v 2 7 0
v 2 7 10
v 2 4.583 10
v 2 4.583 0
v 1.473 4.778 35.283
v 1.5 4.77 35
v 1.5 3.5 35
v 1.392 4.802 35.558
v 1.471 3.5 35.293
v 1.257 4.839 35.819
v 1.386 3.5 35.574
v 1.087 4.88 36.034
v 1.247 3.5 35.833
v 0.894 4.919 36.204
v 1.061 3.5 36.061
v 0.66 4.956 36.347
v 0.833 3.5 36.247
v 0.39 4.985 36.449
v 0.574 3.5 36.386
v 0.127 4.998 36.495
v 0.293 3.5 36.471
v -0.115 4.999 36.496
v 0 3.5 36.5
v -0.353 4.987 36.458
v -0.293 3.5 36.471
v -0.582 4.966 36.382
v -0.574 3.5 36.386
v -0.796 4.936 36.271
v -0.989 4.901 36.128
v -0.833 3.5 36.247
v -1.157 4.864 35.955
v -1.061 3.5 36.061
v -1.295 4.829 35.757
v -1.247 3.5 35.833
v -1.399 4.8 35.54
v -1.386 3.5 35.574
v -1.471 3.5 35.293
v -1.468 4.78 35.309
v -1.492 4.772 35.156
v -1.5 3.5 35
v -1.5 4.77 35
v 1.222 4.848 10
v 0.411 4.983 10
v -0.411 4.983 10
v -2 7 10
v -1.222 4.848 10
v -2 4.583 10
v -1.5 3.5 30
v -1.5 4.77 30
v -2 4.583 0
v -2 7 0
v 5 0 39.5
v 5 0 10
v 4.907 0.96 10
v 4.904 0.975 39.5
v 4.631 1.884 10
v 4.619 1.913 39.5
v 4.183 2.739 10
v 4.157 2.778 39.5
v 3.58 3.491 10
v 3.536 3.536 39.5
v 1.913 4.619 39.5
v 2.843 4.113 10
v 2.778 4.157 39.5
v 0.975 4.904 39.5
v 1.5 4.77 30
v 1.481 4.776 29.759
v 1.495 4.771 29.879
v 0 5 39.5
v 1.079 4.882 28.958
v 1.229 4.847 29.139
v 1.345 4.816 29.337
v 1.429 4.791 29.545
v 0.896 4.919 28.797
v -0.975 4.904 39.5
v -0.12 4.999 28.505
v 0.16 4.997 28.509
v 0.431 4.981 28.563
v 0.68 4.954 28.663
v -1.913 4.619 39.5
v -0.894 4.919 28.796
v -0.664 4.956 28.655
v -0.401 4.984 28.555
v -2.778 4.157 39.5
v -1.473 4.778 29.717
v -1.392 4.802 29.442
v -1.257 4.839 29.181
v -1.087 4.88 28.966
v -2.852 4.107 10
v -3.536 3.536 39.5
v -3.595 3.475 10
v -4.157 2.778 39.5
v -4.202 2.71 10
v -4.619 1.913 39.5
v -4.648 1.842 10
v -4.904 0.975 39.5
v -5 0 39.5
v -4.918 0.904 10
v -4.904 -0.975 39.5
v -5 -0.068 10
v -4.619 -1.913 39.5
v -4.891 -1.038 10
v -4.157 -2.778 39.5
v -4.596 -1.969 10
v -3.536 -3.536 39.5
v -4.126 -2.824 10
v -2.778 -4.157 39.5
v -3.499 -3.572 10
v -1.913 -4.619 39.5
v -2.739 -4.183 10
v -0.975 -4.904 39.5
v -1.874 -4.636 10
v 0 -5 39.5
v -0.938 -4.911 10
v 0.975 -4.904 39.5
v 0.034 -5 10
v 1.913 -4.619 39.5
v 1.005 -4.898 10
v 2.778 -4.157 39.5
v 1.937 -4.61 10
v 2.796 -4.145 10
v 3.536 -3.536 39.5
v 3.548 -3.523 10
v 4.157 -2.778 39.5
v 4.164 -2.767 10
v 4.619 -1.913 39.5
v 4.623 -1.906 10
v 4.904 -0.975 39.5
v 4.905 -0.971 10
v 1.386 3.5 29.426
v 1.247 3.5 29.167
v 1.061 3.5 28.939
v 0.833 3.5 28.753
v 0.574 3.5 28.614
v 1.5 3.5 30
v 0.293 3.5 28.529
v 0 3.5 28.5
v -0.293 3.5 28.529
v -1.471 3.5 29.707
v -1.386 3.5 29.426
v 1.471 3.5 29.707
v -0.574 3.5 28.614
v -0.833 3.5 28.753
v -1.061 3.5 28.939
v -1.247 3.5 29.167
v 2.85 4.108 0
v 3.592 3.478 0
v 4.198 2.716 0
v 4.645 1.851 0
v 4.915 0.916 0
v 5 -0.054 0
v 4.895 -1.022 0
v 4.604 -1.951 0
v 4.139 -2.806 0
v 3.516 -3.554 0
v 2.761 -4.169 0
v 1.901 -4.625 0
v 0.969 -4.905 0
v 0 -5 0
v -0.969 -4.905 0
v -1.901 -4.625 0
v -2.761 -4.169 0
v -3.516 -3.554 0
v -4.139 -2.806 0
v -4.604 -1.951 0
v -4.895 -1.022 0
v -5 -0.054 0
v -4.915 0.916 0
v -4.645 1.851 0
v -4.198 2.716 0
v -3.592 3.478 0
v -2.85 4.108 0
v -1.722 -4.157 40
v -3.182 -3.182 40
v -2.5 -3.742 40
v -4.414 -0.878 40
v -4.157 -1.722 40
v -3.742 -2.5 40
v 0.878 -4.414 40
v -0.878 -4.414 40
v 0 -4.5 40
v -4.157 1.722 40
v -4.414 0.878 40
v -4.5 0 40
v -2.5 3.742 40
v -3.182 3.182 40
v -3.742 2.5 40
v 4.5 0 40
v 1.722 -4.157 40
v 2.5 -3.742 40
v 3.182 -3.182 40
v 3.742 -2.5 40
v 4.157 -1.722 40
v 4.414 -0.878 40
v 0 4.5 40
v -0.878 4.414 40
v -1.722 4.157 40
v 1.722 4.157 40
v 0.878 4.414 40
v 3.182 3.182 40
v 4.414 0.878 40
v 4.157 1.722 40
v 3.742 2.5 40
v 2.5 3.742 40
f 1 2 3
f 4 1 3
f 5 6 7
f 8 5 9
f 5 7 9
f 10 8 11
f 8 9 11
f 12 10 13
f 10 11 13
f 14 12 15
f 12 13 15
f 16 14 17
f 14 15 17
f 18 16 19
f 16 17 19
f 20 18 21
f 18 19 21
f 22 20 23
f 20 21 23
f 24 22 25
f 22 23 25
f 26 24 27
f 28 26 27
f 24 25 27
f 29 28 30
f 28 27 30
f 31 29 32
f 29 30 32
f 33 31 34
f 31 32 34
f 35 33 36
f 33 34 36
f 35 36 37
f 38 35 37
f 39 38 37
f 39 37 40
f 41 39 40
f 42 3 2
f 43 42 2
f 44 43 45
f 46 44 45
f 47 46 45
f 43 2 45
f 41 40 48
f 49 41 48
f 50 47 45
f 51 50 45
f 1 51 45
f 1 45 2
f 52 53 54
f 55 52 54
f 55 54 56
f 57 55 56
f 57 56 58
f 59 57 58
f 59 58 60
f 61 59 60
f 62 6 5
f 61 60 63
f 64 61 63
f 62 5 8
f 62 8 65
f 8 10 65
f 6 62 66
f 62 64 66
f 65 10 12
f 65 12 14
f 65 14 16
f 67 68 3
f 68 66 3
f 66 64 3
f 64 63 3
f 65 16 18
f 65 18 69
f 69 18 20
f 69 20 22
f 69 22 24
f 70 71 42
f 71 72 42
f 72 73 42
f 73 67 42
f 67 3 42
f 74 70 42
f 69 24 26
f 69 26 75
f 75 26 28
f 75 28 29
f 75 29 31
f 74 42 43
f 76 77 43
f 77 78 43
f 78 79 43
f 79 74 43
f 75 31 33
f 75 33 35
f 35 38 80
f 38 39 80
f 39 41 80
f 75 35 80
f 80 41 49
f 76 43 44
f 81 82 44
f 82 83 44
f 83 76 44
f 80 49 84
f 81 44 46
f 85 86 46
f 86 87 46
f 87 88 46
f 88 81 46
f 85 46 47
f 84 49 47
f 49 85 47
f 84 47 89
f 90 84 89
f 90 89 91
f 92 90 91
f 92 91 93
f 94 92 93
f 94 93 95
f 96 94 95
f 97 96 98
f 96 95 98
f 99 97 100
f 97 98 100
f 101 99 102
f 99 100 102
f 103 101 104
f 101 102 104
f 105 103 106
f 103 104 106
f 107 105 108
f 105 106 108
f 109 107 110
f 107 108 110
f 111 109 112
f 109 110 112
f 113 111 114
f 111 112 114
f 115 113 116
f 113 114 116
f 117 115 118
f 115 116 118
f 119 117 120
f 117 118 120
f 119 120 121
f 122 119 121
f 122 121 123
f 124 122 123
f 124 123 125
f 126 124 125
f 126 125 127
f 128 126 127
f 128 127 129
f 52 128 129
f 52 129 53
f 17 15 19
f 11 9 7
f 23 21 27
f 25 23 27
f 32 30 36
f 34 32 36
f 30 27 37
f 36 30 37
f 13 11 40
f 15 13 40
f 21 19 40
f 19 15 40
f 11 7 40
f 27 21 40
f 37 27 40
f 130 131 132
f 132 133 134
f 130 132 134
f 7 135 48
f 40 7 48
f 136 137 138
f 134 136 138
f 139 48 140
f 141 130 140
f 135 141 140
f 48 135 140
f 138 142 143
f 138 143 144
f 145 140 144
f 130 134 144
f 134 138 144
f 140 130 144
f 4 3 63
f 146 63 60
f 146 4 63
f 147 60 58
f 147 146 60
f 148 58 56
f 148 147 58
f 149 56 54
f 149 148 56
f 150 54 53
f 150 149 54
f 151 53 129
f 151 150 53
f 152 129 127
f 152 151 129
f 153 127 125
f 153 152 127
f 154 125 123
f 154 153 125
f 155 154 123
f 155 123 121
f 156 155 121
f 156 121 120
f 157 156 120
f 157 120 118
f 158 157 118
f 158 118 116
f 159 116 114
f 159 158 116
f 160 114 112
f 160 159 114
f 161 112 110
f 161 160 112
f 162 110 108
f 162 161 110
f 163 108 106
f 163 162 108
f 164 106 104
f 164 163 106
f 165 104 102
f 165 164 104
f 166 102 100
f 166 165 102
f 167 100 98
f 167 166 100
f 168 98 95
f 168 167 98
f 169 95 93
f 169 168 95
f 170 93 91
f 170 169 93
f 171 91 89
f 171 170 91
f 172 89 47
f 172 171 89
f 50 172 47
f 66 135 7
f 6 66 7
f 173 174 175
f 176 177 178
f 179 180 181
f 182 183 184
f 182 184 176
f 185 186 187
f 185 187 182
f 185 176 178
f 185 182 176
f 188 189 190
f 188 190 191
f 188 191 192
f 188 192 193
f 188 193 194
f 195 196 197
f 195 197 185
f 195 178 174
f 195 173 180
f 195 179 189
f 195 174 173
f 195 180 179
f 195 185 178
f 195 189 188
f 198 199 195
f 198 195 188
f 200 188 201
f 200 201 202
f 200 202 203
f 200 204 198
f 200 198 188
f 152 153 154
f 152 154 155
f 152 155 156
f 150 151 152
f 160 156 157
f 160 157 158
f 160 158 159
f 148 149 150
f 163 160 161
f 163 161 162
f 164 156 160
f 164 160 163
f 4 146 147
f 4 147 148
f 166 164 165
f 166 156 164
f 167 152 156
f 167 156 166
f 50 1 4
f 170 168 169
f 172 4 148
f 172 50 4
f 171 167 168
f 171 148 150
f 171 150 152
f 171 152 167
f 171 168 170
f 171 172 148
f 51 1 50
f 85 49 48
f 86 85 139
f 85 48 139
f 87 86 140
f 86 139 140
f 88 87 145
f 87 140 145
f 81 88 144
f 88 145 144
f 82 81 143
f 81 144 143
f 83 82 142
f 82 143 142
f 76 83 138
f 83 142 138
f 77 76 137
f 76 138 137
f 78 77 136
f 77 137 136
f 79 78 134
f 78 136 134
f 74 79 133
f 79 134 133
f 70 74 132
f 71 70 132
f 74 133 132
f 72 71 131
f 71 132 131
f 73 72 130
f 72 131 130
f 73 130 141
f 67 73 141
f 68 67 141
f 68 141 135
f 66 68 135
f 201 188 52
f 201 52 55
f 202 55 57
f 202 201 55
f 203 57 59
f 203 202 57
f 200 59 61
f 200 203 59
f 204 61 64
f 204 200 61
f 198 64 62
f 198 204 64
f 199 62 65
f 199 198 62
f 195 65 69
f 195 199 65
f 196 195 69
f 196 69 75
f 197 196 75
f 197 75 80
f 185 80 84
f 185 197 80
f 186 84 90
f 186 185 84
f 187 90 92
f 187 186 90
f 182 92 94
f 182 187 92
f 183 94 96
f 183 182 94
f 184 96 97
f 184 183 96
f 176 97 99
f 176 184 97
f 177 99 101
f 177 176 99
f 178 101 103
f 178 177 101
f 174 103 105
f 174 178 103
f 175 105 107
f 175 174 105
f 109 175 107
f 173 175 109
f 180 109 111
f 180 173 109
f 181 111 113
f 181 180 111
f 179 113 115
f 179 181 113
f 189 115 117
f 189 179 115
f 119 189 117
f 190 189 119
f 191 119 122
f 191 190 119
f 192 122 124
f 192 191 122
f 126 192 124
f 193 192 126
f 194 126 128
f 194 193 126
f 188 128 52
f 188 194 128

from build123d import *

# Parameters (mm, degrees)
BOSS_EXTRUDE1_DEPTH = 10
SKETCH2_R           = 5
BOSS_EXTRUDE2_DEPTH = 30
CUT_EXTRUDE1_START  = 3.5
CUT_EXTRUDE1_DEPTH  = 4.5
CHAMFER1_SIZE       = 0.5


with BuildPart() as part:
    # Sketch1 → Boss-Extrude1 (new body)
    with BuildSketch(Plane.XY):
        with BuildLine():
            Line((-2, 7), (2, 7))
            Line((2, 7), (2, 4.582575695))
            ThreePointArc((2, 4.582575695), (0, -5), (-2, 4.582575695))
            Line((-2, 4.582575695), (-2, 7))
        make_face()
    extrude(amount=BOSS_EXTRUDE1_DEPTH)

    # Sketch2 → Boss-Extrude2 (add)
    with BuildSketch(Plane.XY.offset(10)):
        Circle(SKETCH2_R)
    extrude(amount=BOSS_EXTRUDE2_DEPTH)

    # Sketch3 → Cut-Extrude1 (cut, through all)
    with BuildSketch(Plane(origin=(0, 0, 0), x_dir=(1, 0, 0), z_dir=(0, 1, 0)).offset(CUT_EXTRUDE1_START)):
        with BuildLine():
            Line((1.5, -30), (1.5, -35))
            ThreePointArc((1.5, -35), (0, -36.5), (-1.5, -35))
            Line((-1.5, -35), (-1.5, -30))
            ThreePointArc((-1.5, -30), (0, -28.5), (1.5, -30))
        make_face()
    extrude(amount=CUT_EXTRUDE1_DEPTH, mode=Mode.SUBTRACT)

    # Chamfer1
    chamfer1_edges = [part.edges().sort_by_distance(p)[0] for p in [
        (-5, 0, 40),
    ]]
    chamfer(chamfer1_edges, length=CHAMFER1_SIZE)


solid = part.part
